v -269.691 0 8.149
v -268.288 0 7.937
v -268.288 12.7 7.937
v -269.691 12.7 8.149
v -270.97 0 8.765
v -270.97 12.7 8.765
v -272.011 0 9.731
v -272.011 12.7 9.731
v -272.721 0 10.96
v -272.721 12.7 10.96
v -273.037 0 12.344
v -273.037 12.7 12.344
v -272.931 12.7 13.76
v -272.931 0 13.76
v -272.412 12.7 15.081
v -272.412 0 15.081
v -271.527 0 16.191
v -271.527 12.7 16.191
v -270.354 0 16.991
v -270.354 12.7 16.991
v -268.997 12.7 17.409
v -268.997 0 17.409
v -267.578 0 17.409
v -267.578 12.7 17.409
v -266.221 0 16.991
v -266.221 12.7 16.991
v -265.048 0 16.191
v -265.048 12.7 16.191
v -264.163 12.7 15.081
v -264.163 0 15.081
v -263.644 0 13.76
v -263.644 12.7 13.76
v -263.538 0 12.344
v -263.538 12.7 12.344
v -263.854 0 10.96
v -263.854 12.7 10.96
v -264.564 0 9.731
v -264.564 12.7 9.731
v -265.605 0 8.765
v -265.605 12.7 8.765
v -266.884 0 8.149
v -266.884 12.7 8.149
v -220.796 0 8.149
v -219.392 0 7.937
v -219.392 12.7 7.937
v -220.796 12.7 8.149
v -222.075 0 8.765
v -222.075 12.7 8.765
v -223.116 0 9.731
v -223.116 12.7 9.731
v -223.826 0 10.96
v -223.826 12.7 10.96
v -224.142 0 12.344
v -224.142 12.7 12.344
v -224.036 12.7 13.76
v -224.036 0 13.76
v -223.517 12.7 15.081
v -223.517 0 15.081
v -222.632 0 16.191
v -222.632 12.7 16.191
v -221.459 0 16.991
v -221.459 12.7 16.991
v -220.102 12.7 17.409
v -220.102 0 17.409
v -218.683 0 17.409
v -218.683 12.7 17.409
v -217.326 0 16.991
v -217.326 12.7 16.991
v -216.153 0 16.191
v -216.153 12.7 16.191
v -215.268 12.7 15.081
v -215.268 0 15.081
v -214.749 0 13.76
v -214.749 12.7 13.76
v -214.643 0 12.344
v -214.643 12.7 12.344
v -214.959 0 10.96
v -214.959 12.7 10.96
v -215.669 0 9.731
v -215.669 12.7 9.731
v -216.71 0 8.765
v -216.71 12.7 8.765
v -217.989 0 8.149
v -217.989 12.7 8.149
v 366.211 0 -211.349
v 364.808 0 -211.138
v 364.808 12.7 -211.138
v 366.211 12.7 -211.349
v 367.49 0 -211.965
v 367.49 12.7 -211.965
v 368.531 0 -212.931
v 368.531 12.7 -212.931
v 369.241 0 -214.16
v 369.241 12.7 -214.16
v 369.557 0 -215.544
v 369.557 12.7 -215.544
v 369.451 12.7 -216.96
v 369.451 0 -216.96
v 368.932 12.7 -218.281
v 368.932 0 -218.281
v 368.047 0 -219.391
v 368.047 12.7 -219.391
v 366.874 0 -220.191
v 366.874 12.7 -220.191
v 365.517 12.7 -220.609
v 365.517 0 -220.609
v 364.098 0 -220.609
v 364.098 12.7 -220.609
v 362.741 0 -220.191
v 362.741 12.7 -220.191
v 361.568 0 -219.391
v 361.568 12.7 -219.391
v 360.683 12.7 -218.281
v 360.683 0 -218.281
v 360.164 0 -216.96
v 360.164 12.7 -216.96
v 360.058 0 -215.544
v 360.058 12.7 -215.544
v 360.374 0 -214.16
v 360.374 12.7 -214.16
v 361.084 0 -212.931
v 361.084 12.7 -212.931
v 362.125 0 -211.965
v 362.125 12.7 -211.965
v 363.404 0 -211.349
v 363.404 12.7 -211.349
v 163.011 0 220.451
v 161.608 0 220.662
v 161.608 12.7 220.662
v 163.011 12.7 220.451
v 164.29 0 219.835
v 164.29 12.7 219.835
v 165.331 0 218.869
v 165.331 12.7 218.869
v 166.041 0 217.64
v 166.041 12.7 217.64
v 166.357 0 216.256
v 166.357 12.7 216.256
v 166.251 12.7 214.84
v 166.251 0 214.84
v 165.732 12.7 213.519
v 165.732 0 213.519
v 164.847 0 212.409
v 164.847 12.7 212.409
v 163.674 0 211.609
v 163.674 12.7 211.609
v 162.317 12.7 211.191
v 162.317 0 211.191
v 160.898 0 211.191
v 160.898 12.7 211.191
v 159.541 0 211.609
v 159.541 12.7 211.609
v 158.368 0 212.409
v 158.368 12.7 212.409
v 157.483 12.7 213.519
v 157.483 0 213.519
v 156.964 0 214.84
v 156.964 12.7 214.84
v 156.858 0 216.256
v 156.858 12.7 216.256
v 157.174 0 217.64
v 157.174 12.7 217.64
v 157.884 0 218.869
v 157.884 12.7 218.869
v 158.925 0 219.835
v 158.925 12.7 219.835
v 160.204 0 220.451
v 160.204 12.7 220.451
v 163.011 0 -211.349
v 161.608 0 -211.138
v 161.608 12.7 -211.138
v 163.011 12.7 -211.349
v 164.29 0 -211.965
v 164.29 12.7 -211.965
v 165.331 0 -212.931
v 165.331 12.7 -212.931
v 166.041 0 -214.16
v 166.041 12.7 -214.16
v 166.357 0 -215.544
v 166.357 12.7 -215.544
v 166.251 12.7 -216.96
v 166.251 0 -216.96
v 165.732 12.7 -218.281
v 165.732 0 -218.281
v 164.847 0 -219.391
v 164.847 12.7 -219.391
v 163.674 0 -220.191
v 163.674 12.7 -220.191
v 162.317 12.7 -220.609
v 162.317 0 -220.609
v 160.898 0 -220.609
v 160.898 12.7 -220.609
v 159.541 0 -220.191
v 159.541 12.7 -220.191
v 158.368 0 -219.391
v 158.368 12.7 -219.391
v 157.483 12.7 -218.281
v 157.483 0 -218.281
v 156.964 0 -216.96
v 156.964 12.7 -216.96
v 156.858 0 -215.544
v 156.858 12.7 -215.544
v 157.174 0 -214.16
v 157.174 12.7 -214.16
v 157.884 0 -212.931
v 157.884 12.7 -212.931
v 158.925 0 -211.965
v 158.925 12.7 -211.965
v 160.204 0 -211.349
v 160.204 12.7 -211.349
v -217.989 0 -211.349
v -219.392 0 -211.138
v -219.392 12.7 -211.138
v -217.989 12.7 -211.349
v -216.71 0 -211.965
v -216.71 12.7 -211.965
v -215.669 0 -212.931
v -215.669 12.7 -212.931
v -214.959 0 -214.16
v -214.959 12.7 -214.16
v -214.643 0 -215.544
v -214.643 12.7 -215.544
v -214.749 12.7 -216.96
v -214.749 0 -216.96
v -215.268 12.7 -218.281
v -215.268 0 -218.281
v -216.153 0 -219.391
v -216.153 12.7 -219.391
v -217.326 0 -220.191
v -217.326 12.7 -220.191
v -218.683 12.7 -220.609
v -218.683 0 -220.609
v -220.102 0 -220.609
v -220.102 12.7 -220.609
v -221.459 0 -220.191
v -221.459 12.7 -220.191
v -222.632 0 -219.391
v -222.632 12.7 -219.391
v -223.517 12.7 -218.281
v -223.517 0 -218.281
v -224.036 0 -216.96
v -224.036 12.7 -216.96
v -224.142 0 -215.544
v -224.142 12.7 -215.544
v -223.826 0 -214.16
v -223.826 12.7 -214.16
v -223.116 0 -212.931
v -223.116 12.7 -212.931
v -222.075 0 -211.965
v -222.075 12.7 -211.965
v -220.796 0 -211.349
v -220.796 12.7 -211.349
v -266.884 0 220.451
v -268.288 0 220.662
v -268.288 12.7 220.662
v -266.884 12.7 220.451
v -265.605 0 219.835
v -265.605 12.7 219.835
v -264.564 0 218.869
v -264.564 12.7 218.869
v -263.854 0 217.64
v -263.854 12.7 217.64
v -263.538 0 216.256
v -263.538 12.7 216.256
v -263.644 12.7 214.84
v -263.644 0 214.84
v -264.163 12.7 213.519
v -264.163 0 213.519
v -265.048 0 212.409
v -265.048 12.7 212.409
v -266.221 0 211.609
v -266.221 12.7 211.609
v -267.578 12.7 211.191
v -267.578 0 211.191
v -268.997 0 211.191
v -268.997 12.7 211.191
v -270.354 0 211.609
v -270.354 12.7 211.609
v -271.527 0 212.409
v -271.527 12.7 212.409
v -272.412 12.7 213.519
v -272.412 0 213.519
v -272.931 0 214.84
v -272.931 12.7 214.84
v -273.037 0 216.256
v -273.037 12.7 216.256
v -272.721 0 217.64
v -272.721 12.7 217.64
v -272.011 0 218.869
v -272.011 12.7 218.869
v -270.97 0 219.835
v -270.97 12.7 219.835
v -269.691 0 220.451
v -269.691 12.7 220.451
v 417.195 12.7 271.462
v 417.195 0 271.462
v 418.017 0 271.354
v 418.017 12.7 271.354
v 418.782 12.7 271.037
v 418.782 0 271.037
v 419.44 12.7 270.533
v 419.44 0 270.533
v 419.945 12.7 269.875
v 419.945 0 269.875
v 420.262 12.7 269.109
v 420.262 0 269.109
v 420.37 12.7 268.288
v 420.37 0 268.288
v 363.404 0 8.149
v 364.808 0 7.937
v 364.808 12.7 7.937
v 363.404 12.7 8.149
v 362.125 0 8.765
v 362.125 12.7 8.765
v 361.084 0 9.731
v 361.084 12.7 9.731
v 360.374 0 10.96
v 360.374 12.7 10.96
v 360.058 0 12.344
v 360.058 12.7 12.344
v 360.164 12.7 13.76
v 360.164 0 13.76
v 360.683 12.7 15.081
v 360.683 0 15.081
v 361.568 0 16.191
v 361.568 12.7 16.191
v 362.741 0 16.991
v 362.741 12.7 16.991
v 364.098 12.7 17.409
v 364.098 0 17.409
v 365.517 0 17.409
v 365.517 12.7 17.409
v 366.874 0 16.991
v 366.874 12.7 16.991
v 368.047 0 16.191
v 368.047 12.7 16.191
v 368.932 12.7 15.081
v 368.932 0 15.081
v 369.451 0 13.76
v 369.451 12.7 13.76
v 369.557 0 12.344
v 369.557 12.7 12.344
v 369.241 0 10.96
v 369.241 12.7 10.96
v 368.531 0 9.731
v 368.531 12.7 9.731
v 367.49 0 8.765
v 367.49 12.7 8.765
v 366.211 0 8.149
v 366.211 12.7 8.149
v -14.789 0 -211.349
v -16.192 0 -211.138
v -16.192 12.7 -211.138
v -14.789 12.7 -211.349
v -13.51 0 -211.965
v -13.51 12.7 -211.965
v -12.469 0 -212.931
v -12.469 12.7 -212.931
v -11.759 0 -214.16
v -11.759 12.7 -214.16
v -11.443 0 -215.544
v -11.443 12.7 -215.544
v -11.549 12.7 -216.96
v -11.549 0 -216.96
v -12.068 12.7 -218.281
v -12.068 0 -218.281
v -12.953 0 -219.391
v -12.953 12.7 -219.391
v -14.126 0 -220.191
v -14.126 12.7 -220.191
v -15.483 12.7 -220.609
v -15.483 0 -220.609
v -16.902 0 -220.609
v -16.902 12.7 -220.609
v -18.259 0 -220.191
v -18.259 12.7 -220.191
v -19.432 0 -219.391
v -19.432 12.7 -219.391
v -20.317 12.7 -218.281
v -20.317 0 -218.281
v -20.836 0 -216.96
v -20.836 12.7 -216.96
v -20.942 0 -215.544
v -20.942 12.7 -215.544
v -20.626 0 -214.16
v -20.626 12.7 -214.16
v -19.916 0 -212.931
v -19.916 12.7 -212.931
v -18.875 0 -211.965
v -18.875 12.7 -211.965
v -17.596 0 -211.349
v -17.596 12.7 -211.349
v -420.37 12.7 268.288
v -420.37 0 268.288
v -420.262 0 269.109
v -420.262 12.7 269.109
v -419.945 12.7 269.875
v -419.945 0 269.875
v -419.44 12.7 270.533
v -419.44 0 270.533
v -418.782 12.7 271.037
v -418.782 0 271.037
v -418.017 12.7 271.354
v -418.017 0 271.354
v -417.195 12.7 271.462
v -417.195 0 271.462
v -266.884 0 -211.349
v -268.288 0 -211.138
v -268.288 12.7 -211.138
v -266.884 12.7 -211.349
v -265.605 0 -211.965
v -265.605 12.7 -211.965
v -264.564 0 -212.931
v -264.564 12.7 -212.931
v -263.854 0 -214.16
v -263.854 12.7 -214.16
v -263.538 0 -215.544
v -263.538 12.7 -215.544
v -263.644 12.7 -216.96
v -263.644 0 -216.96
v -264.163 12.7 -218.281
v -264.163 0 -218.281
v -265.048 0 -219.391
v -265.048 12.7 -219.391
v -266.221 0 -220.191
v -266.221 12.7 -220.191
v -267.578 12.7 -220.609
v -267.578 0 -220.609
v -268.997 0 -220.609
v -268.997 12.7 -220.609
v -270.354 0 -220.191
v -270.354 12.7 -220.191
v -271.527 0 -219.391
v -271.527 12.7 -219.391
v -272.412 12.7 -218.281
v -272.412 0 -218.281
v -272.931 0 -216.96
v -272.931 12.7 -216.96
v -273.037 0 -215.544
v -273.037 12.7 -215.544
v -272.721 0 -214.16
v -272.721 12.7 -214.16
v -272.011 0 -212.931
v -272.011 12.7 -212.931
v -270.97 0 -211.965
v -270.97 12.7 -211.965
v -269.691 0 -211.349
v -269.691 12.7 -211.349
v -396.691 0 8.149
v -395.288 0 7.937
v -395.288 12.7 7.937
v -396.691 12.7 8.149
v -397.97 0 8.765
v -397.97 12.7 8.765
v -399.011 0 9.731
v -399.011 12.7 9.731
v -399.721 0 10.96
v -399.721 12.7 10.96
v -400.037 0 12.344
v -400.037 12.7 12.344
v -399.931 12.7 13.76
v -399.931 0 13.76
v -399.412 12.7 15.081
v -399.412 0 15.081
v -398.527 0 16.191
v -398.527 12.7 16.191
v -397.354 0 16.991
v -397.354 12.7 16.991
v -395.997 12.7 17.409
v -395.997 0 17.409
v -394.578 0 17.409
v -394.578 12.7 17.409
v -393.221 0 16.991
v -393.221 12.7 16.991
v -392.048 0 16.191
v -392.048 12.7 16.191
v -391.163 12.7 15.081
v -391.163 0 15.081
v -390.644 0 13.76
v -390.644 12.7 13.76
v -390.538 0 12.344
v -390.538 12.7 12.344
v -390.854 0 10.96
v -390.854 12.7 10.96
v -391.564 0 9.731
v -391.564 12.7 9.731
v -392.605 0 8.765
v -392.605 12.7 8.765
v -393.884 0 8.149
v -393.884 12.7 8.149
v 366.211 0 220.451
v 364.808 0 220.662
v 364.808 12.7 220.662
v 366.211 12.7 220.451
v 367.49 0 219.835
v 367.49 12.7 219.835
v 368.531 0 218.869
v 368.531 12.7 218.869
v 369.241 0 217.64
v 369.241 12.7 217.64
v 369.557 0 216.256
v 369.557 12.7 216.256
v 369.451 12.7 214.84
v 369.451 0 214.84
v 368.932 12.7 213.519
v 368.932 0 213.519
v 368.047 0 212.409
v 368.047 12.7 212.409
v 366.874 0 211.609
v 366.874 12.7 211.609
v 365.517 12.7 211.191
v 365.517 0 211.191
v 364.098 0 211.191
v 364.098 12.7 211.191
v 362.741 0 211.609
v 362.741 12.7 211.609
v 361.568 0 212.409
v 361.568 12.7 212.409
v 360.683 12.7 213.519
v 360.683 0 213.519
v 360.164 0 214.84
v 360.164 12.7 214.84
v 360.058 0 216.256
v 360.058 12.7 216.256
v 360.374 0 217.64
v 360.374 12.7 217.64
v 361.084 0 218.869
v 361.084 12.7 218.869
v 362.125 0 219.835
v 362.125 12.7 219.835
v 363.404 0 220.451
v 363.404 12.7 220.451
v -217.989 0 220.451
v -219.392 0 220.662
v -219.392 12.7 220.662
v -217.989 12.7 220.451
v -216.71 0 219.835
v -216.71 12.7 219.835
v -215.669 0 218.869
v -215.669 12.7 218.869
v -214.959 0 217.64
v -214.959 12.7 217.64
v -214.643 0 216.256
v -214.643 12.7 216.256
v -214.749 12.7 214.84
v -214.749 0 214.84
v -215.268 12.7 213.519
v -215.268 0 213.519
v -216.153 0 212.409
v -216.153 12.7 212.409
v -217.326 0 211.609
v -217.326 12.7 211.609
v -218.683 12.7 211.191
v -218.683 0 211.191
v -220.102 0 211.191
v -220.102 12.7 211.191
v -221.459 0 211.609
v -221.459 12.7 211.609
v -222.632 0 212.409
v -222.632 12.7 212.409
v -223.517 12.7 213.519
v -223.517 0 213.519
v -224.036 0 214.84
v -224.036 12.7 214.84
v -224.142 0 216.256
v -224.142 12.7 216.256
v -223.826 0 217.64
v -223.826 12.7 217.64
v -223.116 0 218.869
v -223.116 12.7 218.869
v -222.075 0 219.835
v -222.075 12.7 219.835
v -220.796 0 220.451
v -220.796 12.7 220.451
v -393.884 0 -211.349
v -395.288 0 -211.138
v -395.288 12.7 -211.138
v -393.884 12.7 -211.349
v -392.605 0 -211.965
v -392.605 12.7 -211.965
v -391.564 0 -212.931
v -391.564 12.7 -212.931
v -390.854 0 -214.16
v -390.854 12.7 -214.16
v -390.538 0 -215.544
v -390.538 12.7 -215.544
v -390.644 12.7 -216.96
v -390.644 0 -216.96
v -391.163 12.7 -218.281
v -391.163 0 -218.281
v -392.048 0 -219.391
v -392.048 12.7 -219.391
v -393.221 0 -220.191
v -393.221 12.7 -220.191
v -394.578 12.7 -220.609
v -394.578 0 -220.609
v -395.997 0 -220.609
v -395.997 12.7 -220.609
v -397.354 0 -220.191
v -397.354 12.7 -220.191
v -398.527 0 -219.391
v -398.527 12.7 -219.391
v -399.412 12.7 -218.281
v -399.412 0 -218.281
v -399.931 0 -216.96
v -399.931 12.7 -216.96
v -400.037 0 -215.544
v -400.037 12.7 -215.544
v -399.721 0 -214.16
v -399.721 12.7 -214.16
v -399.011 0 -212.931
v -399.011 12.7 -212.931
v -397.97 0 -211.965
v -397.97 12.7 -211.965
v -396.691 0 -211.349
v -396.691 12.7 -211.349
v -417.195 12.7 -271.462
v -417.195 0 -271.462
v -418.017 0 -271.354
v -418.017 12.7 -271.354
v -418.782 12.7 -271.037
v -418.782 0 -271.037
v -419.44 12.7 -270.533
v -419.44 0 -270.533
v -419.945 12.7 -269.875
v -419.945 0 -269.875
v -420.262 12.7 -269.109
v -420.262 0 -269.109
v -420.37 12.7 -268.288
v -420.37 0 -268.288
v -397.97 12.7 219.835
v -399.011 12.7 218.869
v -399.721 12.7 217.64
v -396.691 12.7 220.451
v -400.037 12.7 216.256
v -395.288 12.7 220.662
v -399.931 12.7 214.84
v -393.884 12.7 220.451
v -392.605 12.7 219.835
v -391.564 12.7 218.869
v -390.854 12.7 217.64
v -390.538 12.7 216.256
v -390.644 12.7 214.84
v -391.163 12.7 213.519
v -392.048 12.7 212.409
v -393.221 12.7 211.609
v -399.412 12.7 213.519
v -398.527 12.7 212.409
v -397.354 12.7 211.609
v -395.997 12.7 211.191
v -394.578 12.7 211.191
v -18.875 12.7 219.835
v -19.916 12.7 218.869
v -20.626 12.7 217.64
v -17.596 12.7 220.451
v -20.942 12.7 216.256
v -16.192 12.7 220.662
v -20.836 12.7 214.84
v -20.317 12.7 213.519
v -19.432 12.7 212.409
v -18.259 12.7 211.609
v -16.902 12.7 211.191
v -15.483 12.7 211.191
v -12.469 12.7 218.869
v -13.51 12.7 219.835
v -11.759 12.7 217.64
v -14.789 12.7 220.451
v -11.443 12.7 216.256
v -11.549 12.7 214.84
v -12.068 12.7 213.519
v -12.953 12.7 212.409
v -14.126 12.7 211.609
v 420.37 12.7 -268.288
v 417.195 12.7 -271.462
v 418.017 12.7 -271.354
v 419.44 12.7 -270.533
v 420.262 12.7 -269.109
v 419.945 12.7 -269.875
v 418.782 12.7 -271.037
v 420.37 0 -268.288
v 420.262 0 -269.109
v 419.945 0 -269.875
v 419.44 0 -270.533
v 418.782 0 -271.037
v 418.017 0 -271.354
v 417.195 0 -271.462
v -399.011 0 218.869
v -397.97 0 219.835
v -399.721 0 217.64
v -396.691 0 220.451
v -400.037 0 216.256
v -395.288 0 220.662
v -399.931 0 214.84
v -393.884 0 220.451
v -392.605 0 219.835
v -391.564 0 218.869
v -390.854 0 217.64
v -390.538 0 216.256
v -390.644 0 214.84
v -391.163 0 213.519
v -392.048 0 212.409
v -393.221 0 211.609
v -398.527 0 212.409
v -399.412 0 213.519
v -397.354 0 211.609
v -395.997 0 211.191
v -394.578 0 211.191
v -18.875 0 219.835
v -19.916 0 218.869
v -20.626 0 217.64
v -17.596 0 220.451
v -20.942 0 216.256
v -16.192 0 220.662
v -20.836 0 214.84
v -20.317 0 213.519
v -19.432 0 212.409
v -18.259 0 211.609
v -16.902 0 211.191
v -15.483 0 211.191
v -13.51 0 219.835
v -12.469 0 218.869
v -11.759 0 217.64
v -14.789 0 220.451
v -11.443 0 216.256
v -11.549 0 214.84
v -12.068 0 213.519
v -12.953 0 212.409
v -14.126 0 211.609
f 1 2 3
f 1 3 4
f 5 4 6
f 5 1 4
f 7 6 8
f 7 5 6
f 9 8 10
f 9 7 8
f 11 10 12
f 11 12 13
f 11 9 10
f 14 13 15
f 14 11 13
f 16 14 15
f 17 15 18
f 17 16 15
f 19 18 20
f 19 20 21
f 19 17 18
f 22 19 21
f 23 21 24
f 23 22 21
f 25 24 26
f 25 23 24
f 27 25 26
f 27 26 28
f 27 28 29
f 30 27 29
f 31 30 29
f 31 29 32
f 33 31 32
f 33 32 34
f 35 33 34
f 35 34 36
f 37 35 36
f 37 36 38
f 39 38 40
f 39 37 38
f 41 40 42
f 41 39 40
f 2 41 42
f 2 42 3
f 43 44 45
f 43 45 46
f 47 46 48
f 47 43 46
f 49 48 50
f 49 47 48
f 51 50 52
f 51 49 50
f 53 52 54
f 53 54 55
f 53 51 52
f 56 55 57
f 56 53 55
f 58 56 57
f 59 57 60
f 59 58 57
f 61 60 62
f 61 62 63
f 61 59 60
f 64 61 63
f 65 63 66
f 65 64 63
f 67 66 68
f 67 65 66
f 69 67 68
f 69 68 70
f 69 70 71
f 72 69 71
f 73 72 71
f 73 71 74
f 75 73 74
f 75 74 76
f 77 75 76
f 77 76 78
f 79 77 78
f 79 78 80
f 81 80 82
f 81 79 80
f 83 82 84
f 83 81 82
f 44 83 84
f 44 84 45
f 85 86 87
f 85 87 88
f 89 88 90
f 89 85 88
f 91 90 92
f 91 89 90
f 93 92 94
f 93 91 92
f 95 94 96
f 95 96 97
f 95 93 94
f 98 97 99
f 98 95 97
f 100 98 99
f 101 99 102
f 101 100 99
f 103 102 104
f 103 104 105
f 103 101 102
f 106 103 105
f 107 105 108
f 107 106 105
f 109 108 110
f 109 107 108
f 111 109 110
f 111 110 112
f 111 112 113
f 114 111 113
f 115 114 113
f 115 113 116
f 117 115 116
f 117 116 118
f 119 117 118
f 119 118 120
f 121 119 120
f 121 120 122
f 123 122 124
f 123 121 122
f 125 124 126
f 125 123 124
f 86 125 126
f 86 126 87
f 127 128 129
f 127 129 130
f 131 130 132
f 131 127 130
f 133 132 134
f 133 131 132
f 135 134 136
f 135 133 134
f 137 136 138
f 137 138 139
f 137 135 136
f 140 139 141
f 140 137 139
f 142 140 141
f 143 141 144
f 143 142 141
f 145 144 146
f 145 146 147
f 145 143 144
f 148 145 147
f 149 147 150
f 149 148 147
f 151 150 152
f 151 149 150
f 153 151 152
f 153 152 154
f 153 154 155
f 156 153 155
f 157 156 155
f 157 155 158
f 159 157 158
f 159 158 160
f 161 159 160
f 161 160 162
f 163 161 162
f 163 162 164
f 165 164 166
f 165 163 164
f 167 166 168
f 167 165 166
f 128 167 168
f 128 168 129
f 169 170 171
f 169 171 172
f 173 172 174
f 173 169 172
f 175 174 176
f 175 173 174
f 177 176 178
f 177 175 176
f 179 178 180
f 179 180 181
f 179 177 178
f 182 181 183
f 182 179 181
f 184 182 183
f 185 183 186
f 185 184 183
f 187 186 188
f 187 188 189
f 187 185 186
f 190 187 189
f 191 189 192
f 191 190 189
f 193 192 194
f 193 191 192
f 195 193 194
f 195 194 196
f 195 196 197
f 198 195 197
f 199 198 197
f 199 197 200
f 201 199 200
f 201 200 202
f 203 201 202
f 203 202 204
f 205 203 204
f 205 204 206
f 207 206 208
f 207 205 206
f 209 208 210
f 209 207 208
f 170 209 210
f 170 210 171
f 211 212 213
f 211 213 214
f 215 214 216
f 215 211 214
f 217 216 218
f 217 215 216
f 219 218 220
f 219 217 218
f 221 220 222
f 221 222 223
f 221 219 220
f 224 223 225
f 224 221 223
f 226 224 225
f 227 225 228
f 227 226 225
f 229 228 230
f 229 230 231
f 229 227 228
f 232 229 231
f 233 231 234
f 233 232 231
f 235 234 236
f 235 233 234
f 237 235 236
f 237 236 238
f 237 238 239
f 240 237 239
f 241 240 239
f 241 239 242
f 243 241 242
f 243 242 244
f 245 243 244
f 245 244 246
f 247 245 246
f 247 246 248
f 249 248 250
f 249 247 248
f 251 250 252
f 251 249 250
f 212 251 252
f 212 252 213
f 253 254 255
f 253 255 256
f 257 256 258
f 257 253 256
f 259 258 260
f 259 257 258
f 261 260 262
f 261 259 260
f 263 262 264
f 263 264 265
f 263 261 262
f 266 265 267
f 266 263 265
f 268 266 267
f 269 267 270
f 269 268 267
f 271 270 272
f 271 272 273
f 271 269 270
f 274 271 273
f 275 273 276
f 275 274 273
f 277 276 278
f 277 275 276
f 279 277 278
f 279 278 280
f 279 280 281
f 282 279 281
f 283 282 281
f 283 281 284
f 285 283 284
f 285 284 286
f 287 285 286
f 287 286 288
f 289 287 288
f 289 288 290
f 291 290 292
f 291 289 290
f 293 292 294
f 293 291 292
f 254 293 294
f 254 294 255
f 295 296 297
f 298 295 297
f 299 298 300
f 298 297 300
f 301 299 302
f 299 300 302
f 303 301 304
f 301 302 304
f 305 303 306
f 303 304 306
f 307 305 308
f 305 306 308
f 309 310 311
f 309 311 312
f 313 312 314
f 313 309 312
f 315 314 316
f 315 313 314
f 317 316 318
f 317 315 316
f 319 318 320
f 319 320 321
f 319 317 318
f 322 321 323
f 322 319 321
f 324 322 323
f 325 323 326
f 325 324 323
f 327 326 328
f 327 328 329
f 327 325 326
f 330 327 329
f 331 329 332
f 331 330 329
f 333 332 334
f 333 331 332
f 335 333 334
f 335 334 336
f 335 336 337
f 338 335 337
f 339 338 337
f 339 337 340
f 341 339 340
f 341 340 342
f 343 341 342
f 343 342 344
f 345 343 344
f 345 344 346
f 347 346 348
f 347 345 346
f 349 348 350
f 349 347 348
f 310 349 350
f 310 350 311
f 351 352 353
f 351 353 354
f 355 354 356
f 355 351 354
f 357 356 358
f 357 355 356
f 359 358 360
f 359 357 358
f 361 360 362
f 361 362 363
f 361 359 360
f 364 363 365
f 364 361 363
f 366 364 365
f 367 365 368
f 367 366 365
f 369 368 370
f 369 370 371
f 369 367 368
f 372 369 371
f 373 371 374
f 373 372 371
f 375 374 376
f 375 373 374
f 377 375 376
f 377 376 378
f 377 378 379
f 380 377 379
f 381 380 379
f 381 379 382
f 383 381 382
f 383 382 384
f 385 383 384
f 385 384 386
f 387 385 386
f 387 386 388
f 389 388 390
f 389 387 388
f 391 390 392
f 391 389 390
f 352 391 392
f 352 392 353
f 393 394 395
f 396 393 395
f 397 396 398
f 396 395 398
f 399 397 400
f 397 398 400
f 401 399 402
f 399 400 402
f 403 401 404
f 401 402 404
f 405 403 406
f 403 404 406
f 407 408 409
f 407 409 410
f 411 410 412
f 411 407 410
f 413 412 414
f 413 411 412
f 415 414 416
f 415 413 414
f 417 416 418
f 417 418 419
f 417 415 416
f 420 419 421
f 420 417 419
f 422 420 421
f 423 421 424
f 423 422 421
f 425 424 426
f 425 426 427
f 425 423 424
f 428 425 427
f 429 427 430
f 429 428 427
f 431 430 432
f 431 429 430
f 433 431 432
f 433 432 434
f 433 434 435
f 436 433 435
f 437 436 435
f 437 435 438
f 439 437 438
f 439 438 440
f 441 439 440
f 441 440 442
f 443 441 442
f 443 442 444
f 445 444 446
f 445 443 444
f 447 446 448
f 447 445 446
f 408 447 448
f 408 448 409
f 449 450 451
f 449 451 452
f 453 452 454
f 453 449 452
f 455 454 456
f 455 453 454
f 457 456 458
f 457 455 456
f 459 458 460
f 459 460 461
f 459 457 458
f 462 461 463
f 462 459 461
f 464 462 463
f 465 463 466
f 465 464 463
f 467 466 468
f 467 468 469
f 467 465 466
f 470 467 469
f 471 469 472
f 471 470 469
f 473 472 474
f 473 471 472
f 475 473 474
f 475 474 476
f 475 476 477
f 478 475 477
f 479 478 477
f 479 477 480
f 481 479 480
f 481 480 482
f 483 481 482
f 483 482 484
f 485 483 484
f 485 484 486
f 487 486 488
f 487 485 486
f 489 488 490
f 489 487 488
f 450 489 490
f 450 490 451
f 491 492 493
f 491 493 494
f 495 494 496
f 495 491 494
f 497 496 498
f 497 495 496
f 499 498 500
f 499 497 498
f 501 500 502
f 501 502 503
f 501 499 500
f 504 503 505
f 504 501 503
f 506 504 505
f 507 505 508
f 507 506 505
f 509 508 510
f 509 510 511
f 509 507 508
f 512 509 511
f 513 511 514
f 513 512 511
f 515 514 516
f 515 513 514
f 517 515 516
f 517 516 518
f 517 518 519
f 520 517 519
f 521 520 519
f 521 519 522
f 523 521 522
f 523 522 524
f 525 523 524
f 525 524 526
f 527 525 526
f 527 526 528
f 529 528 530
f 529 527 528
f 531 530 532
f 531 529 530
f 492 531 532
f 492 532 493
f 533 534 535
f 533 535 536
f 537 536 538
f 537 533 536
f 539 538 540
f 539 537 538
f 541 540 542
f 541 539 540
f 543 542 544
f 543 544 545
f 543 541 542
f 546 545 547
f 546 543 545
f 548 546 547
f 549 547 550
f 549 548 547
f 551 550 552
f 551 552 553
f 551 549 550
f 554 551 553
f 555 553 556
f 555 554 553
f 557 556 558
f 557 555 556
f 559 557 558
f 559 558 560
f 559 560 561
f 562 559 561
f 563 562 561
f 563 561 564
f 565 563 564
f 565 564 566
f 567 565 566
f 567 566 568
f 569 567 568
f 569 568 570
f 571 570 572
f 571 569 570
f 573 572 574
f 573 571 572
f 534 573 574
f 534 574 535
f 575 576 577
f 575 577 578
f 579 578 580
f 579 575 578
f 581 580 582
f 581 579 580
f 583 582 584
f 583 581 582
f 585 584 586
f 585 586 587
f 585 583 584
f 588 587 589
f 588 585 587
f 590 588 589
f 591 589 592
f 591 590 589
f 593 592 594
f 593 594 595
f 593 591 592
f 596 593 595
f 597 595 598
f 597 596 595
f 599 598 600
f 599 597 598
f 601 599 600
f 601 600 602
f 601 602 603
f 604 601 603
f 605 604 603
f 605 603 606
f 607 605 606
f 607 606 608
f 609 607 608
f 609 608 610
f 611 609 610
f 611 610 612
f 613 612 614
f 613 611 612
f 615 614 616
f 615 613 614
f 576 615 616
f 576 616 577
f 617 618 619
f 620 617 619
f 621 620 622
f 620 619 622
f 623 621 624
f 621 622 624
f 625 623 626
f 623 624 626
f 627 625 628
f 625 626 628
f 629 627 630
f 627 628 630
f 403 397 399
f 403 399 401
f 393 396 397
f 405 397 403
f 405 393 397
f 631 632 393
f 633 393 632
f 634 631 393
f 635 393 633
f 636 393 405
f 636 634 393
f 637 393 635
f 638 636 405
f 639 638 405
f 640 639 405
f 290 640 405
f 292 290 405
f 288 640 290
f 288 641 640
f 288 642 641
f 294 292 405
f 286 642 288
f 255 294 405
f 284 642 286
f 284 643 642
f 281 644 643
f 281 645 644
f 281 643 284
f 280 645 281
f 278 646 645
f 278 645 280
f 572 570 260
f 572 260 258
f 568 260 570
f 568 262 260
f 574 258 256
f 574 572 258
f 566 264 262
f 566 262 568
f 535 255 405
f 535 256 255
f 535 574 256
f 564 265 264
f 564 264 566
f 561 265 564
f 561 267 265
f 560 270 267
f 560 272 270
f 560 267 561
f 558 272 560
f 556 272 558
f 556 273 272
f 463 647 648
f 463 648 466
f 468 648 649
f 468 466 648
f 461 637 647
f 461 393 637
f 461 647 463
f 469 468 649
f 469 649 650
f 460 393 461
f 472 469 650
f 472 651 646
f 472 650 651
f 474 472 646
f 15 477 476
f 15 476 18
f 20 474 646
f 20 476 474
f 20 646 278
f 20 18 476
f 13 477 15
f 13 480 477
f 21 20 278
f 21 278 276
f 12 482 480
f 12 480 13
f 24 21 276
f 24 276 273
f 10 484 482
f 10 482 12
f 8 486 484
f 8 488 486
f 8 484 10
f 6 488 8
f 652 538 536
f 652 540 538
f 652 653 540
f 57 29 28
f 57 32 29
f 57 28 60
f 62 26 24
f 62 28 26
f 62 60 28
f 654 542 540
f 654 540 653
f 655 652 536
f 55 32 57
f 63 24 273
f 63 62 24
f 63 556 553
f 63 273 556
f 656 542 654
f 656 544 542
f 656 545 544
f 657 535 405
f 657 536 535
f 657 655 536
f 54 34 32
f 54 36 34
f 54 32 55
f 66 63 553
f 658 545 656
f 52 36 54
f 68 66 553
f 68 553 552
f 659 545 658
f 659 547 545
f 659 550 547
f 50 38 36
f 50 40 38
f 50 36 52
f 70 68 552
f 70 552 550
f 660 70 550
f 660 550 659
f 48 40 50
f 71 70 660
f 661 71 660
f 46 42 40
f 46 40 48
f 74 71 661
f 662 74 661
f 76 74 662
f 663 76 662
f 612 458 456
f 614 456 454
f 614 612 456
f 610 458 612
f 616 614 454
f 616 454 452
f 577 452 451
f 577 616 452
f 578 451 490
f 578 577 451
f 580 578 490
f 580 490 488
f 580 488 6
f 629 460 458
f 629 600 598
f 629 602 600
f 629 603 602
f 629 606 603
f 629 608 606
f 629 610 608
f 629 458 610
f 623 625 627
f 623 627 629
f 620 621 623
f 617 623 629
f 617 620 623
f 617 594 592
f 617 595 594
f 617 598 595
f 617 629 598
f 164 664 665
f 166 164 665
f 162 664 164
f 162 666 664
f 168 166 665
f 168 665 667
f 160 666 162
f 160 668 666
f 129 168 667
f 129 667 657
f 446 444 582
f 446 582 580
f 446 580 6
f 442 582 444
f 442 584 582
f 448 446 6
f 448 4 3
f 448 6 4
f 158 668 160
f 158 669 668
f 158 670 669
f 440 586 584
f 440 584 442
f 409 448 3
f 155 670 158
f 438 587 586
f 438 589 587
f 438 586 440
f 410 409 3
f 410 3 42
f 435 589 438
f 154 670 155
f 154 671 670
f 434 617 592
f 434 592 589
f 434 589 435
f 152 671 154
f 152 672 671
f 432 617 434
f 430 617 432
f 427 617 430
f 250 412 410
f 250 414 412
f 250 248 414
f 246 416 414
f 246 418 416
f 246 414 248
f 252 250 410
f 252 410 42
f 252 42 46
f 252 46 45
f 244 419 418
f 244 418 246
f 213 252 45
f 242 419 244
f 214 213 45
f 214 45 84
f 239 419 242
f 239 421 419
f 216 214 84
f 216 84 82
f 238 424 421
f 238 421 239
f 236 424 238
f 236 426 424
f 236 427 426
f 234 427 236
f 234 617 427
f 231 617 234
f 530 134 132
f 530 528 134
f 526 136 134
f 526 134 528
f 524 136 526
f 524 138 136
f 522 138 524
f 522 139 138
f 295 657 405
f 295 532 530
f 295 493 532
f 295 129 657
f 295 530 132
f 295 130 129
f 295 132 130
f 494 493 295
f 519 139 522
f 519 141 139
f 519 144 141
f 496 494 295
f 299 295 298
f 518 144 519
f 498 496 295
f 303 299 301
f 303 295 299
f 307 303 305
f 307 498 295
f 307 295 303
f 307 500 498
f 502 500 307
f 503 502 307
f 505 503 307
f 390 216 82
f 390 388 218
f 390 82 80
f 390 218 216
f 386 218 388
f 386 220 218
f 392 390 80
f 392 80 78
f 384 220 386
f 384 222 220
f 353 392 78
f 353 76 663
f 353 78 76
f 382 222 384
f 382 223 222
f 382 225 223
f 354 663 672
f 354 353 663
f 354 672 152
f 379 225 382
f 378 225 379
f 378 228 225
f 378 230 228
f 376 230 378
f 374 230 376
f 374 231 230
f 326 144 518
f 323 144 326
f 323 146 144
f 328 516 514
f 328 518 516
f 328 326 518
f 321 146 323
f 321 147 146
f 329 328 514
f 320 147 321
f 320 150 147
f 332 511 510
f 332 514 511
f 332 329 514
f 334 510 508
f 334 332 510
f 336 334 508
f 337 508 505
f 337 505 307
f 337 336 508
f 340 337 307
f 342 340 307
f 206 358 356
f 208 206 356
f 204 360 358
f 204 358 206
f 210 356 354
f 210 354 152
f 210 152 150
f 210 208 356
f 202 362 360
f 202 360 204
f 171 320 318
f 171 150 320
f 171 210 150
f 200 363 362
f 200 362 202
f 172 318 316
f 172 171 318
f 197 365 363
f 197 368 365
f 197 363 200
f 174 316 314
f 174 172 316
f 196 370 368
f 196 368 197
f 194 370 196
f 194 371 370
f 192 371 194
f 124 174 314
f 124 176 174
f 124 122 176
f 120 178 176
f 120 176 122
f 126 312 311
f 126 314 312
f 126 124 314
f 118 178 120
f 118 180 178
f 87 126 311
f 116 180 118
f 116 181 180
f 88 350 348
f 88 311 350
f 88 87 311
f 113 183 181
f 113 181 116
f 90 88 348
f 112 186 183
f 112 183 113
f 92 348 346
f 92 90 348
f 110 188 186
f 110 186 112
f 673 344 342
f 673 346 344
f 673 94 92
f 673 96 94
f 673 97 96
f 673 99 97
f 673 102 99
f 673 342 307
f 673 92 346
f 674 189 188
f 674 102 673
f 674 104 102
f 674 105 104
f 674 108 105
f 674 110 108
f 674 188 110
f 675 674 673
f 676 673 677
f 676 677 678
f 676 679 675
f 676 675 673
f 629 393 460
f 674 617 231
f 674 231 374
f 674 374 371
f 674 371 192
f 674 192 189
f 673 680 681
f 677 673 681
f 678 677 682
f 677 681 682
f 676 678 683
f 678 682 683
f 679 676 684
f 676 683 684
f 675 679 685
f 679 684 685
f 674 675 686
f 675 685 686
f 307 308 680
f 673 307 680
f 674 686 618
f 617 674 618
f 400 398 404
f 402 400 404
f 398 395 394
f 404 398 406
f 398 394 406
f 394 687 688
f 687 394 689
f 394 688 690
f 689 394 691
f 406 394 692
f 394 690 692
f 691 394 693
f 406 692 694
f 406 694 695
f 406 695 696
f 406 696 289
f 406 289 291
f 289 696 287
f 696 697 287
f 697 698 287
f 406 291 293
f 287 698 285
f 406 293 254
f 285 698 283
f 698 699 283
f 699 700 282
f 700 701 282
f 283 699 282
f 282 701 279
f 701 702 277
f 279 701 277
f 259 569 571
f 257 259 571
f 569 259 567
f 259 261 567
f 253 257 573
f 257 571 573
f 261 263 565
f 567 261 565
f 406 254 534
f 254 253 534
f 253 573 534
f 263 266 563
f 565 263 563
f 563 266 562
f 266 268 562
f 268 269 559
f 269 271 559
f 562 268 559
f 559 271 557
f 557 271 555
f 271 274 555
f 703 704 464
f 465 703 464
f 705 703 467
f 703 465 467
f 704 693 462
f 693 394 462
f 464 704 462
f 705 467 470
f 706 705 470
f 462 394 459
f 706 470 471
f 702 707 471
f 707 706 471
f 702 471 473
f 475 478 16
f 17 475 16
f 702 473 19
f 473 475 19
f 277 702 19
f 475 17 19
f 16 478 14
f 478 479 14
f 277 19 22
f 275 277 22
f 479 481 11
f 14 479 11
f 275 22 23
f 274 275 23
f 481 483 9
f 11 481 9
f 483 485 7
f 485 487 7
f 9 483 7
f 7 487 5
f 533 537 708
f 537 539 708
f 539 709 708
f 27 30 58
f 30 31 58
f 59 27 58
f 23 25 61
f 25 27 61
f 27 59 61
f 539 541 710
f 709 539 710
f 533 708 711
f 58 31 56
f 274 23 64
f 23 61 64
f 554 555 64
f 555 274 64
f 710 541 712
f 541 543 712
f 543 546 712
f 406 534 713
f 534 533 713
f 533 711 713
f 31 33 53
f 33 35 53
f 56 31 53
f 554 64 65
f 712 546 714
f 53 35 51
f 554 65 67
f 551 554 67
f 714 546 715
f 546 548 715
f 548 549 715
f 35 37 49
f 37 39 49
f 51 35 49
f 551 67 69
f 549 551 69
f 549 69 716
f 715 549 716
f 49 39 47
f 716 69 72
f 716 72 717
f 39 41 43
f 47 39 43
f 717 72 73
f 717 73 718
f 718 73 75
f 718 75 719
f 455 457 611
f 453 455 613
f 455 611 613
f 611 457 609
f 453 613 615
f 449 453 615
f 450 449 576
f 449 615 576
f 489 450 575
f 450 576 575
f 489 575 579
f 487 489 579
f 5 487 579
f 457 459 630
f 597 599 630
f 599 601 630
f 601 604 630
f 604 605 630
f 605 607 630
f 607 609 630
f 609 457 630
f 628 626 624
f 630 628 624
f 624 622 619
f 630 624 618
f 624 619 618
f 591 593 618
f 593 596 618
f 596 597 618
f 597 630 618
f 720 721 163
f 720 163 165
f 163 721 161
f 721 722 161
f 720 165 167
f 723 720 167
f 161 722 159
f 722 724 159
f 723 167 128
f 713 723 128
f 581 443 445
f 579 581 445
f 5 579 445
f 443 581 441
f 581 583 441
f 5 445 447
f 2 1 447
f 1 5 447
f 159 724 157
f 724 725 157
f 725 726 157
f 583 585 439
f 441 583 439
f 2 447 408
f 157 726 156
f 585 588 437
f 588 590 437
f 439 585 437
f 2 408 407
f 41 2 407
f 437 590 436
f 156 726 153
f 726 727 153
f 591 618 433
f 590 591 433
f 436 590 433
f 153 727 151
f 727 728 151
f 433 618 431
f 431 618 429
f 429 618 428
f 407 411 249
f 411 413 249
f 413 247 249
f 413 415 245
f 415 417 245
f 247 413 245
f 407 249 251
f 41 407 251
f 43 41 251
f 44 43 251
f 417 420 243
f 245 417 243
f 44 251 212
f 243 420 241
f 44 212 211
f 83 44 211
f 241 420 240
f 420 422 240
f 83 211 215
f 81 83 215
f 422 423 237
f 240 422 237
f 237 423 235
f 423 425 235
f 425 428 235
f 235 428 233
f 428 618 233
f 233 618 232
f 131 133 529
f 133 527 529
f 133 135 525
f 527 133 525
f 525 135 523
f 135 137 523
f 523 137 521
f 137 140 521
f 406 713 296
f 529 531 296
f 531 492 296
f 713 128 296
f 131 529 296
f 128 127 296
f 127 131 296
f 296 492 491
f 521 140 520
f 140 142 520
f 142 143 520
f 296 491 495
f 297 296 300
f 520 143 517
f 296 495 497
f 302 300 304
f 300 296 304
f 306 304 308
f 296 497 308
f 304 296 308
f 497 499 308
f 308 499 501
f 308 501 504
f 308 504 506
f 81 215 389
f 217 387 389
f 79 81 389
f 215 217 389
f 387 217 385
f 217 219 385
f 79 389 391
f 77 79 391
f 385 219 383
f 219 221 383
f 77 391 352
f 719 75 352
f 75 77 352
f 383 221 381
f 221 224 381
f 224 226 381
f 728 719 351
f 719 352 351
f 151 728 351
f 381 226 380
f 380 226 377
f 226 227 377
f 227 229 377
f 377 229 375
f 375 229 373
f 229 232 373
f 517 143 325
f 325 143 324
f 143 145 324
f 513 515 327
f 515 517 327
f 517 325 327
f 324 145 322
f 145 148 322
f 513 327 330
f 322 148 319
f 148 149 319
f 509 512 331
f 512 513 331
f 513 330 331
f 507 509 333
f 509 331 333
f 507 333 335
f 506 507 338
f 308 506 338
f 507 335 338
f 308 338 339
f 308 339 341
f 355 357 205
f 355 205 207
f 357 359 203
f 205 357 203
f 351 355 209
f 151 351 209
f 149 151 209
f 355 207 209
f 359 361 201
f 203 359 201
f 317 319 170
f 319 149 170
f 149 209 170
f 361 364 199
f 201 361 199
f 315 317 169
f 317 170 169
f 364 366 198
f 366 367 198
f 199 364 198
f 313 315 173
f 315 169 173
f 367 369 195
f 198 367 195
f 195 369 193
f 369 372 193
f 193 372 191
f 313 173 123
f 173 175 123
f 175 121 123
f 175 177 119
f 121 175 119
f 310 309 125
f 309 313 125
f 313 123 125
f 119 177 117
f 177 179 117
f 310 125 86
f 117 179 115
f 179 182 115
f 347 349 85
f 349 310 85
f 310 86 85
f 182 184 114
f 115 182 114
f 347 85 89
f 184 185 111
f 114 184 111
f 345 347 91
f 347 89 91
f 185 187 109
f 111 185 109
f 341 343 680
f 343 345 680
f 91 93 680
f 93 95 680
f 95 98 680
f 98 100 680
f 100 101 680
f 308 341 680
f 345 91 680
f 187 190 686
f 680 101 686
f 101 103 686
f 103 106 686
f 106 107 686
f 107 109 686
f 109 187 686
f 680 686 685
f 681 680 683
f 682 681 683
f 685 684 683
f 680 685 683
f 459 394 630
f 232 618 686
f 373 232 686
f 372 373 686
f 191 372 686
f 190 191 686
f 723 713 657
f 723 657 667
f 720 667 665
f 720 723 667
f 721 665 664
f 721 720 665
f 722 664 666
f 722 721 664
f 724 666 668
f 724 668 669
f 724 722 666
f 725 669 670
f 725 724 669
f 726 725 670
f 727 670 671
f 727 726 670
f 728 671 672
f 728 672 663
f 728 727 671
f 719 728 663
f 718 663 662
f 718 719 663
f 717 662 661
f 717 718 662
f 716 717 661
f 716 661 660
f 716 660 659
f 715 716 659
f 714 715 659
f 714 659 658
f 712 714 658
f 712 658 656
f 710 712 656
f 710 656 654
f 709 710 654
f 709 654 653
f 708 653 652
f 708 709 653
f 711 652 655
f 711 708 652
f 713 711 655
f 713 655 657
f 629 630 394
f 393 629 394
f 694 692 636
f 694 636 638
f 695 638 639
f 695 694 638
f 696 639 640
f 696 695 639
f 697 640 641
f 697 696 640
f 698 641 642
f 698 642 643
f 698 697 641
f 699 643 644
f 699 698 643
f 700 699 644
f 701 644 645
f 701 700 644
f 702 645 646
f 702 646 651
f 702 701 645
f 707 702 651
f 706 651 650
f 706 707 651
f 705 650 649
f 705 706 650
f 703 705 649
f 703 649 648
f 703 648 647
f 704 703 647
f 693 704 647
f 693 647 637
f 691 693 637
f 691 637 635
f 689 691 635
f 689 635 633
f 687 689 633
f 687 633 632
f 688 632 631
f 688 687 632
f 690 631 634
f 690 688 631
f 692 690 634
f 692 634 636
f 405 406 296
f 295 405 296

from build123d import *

# Parameters (mm, degrees)
SKETCH1_R           = 4.7625
BOSS_EXTRUDE1_DEPTH = 12.7


with BuildPart() as part:
    # Sketch1 → Boss-Extrude1 (new body)
    with BuildSketch(Plane(origin=(0, 0, 0), x_dir=(1, 0, 0), z_dir=(0, 1, 0))):
        with BuildLine():
            Line((-420.37, 268.2875), (-420.37, -268.2875))
            ThreePointArc((-420.37, -268.2875), (-419.44006403, -270.53256403), (-417.195, -271.4625))
            Line((-417.195, -271.4625), (417.195, -271.4625))
            ThreePointArc((417.195, -271.4625), (419.44006403, -270.53256403), (420.37, -268.2875))
            Line((420.37, -268.2875), (420.37, 268.2875))
            ThreePointArc((420.37, 268.2875), (419.44006403, 270.53256403), (417.195, 271.4625))
            Line((417.195, 271.4625), (-417.195, 271.4625))
            ThreePointArc((-417.195, 271.4625), (-419.44006403, 270.53256403), (-420.37, 268.2875))
        make_face()
        with Locations(Location((-16.1925, -215.9, 0), (0, 0, 270))):
            Circle(SKETCH1_R, mode=Mode.SUBTRACT)
        with Locations(Location((161.6075, -215.9, 0), (0, 0, 270))):
            Circle(SKETCH1_R, mode=Mode.SUBTRACT)
        with Locations(Location((161.6075, 215.9, 0), (0, 0, 270))):
            Circle(SKETCH1_R, mode=Mode.SUBTRACT)
        with Locations(Location((-16.1925, 215.9, 0), (0, 0, 270))):
            Circle(SKETCH1_R, mode=Mode.SUBTRACT)
        with Locations(Location((-268.2875, -215.9, 0), (0, 0, 270))):
            Circle(SKETCH1_R, mode=Mode.SUBTRACT)
        with Locations(Location((-395.2875, -215.9, 0), (0, 0, 270))):
            Circle(SKETCH1_R, mode=Mode.SUBTRACT)
        with Locations(Location((-268.2875, 215.9, 0), (0, 0, 270))):
            Circle(SKETCH1_R, mode=Mode.SUBTRACT)
        with Locations(Location((-395.2875, 215.9, 0), (0, 0, 270))):
            Circle(SKETCH1_R, mode=Mode.SUBTRACT)
        with Locations(Location((364.8075, -215.9, 0), (0, 0, 270))):
            Circle(SKETCH1_R, mode=Mode.SUBTRACT)
        with Locations(Location((-219.3925, -215.9, 0), (0, 0, 270))):
            Circle(SKETCH1_R, mode=Mode.SUBTRACT)
        with Locations(Location((364.8075, 215.9, 0), (0, 0, 270))):
            Circle(SKETCH1_R, mode=Mode.SUBTRACT)
        with Locations(Location((-219.3925, 215.9, 0), (0, 0, 270))):
            Circle(SKETCH1_R, mode=Mode.SUBTRACT)
        with Locations(Location((-219.3925, -12.7, 0), (0, 0, 90))):
            Circle(SKETCH1_R, mode=Mode.SUBTRACT)
        with Locations(Location((364.8075, -12.7, 0), (0, 0, 90))):
            Circle(SKETCH1_R, mode=Mode.SUBTRACT)
        with Locations(Location((-395.2875, -12.7, 0), (0, 0, 90))):
            Circle(SKETCH1_R, mode=Mode.SUBTRACT)
        with Locations(Location((-268.2875, -12.7, 0), (0, 0, 90))):
            Circle(SKETCH1_R, mode=Mode.SUBTRACT)
    extrude(amount=BOSS_EXTRUDE1_DEPTH)


solid = part.part
